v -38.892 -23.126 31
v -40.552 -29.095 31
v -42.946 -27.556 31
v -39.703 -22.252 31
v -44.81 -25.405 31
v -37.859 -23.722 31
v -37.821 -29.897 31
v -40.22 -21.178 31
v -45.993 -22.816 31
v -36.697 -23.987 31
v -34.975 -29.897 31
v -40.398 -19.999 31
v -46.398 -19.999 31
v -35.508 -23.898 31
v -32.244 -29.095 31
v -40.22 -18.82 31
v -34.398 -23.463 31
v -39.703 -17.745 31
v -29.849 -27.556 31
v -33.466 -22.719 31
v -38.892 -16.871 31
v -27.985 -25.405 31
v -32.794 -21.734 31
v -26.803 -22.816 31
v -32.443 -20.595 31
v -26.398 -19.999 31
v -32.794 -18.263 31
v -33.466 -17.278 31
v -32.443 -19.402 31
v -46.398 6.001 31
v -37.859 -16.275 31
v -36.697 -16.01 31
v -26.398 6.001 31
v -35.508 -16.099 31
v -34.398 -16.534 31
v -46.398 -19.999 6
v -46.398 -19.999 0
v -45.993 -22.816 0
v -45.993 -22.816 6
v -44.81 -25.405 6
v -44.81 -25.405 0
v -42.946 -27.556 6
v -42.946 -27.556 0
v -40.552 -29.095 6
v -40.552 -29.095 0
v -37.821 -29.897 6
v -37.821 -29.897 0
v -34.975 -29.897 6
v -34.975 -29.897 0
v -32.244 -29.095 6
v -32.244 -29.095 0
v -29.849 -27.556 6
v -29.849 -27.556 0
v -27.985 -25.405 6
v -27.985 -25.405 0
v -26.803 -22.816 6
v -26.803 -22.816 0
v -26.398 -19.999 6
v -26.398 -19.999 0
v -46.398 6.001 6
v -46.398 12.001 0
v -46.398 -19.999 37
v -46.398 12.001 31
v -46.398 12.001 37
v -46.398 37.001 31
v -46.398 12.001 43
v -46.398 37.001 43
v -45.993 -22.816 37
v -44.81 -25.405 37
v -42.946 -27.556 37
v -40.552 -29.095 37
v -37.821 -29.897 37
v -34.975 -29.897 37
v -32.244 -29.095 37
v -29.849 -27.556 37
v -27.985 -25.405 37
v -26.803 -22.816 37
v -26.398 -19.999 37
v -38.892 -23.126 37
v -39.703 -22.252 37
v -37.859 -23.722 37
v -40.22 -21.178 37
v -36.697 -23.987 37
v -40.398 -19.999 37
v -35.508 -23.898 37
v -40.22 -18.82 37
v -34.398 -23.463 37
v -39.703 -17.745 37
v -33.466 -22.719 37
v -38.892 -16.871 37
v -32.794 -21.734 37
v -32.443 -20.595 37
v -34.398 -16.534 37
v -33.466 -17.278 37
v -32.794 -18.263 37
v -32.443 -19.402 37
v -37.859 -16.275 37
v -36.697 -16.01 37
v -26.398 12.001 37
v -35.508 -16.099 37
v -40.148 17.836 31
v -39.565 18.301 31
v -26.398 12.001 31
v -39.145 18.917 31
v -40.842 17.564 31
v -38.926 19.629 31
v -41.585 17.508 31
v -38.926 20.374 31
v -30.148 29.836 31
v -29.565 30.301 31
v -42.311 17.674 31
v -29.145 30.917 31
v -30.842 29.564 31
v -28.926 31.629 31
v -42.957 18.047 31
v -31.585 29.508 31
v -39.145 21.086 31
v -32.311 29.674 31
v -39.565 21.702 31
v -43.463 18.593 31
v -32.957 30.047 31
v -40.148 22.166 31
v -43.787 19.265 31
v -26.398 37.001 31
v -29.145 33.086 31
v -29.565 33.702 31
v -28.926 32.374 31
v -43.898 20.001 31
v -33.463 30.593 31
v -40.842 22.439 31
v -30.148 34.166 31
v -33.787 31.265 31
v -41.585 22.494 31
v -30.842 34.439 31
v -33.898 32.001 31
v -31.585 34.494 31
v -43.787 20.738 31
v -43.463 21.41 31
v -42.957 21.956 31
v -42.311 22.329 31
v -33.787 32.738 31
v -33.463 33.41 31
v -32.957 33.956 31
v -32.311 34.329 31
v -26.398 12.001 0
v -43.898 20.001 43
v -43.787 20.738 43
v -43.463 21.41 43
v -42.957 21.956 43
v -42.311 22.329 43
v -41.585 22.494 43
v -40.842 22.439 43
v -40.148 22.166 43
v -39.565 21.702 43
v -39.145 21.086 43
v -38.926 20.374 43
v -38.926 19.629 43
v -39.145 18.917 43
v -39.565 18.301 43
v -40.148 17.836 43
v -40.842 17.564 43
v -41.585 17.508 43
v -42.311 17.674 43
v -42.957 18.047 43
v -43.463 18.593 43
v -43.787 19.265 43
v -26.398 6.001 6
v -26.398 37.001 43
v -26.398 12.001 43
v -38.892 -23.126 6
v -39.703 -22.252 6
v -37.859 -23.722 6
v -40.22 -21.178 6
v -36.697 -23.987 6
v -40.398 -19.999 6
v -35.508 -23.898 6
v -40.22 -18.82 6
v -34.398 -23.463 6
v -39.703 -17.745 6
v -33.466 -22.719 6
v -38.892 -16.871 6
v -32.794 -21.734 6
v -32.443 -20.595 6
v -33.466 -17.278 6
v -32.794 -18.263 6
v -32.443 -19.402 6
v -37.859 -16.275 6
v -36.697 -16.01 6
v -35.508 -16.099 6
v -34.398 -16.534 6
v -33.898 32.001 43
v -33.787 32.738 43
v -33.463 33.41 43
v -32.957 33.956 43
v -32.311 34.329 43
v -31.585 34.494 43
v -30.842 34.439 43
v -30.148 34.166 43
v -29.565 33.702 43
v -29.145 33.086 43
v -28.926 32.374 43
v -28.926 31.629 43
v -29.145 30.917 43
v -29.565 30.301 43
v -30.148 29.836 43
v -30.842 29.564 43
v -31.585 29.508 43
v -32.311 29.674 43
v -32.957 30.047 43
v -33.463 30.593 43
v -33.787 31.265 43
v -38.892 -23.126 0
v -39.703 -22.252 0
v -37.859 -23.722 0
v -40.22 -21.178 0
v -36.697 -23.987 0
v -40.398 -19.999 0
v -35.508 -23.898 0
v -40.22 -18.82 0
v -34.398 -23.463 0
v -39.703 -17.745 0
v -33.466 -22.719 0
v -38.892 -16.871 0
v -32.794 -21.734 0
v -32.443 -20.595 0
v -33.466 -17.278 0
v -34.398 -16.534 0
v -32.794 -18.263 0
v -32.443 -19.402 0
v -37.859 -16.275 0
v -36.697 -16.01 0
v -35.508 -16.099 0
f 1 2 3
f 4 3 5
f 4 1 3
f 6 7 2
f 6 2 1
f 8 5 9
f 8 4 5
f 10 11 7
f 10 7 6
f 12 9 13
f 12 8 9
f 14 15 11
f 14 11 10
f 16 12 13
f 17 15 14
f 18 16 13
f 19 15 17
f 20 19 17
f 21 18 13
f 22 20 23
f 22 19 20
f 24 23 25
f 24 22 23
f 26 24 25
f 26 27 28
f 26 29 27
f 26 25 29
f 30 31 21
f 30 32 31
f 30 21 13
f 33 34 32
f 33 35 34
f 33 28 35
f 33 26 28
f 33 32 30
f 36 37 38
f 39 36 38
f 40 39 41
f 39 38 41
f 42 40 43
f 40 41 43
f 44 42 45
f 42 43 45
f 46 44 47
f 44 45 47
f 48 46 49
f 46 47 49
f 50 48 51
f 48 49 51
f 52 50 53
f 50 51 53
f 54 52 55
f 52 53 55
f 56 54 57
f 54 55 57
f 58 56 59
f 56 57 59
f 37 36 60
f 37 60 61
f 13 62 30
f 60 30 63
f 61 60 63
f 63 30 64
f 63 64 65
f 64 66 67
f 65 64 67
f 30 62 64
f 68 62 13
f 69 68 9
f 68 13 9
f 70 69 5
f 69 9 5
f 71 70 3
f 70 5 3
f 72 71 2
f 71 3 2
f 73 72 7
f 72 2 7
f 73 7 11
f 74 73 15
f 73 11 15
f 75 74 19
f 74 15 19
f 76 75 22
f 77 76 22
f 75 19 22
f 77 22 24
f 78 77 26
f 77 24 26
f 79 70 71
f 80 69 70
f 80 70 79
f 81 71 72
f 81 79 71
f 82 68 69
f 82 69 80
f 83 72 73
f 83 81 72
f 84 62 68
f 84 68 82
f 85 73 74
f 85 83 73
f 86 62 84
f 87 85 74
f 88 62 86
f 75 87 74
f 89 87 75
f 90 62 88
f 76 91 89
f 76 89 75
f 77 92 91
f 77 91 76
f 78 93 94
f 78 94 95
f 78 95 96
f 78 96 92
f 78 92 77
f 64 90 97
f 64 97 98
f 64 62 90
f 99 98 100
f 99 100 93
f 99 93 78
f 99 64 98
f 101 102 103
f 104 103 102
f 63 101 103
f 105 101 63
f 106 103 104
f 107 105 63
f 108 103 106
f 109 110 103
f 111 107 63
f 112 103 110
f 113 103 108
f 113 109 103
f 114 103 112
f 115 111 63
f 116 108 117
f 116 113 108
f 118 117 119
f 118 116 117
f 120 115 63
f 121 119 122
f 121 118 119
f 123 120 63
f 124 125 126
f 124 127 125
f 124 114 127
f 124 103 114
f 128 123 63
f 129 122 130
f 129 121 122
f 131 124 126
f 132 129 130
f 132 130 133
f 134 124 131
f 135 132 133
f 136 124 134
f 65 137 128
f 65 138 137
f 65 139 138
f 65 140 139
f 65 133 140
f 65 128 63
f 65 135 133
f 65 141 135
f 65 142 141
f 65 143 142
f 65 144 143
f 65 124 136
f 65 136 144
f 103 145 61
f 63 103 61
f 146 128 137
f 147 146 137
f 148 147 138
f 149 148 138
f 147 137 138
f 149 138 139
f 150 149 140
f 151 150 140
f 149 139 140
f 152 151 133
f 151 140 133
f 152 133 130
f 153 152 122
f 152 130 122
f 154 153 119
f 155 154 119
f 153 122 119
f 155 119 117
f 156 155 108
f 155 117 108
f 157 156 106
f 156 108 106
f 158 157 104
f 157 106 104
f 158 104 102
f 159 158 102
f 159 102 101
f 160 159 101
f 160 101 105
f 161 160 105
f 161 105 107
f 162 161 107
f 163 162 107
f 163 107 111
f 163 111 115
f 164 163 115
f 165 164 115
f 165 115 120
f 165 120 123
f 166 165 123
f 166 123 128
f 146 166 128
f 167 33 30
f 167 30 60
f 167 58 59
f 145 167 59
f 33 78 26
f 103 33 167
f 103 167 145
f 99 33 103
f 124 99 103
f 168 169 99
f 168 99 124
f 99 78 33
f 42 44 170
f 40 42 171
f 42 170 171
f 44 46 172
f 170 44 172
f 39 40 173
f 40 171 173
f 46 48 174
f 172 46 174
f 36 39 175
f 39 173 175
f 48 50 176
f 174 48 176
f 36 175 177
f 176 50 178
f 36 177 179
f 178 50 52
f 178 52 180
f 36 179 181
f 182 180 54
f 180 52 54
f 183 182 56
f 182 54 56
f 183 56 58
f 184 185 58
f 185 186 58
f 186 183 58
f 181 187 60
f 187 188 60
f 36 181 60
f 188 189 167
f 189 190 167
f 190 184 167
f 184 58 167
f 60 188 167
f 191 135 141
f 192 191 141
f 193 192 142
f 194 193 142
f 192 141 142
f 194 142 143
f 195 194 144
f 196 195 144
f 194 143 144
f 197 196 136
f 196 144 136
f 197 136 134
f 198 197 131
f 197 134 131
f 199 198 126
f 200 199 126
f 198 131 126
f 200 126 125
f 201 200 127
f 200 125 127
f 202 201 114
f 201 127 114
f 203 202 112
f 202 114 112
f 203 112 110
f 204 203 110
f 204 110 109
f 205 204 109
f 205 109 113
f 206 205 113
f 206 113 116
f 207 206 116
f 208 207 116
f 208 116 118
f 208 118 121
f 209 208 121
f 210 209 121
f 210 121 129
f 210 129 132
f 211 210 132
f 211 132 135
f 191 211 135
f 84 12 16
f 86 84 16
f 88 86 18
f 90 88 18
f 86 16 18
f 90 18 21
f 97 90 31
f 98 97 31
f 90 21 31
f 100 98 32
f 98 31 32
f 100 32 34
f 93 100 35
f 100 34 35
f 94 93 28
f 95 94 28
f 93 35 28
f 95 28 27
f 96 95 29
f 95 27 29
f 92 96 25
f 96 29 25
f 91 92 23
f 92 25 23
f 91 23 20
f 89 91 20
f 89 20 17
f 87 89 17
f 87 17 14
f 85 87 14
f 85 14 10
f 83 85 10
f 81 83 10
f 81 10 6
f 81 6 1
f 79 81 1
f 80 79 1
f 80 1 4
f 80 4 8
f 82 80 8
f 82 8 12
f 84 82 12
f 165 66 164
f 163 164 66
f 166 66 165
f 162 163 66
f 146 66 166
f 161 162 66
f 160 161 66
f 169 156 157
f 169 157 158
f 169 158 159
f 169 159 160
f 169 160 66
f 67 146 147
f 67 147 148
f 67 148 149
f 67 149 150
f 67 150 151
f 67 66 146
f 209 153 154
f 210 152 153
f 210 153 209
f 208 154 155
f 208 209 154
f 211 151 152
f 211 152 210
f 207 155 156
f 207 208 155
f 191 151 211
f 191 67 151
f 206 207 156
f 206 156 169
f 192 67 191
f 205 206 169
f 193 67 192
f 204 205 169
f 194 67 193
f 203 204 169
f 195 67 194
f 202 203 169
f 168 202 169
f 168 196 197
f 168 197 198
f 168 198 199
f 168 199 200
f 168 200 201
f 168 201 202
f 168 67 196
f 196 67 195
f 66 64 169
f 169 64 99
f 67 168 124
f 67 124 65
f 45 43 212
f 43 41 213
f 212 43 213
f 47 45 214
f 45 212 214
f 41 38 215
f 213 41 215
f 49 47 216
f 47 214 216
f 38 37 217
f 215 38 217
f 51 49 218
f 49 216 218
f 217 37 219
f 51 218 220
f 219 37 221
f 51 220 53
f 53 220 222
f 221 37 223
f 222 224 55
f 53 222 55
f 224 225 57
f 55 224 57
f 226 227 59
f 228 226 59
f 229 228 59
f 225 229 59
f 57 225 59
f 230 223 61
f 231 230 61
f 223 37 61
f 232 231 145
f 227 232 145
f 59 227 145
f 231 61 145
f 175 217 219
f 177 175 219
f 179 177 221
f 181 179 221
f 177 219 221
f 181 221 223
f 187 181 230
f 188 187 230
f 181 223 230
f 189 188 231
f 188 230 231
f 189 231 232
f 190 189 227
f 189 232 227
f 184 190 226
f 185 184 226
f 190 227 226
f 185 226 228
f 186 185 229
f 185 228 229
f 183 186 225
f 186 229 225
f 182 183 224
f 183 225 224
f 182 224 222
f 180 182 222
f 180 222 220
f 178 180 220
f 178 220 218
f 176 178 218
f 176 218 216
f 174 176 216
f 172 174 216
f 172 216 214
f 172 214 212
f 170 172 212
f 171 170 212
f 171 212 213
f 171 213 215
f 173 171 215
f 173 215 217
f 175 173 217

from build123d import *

# Parameters (mm, degrees)
EXTRUDE_1_DEPTH     = 37
SKETCH_5_R          = 4
CUT_EXTRUDE_1_DEPTH = 67.495686501
SKETCH_6_W          = 25
SKETCH_6_H          = 39.826286975
CUT_EXTRUDE_2_DEPTH = 52.661548552
SKETCH_8_W          = 20
SKETCH_8_H          = 25
EXTRUDE_5_DEPTH     = 6
SKETCH_8_3_W        = 20
SKETCH_8_3_H        = 25
EXTRUDE_6_DEPTH     = 6
SKETCH_10_W         = 20
SKETCH_10_H         = 25
EXTRUDE_7_DEPTH     = 6
SKETCH_11_R         = 2.5
CUT_EXTRUDE_3_DEPTH = 67.954199448


with BuildPart() as part:
    # 草图1 → 凸台-拉伸1 (new body)
    with BuildSketch(Plane.XY):
        with BuildLine():
            Line((-26.397852585, -19.99859328), (-26.397852585, 12.00140672))
            Line((-26.397852585, 12.00140672), (-46.397852585, 12.00140672))
            Line((-46.397852585, 12.00140672), (-46.397852585, -19.99859328))
            ThreePointArc((-46.397852585, -19.99859328), (-36.397852585, -29.99859328), (-26.397852585, -19.99859328))
        make_face()
    extrude(amount=EXTRUDE_1_DEPTH)

    # 草图5 → 切除-拉伸1 (cut, through all)
    with BuildSketch(Plane(origin=(0, 0, 0), x_dir=(-1, 0, 0), z_dir=(0, 0, -1))):
        with Locations((36.397852585, -19.99859328)):
            Circle(SKETCH_5_R)
    extrude(amount=-CUT_EXTRUDE_1_DEPTH, mode=Mode.SUBTRACT)

    # 草图6 → 切除-拉伸2 (cut, through all)
    with BuildSketch(Plane(origin=(-26.397852585, 0, 0), x_dir=(0, 0, -1), z_dir=(1, 0, 0))):
        with Locations((-18.5, -13.911736768)):
            Rectangle(SKETCH_6_W, SKETCH_6_H)
    extrude(amount=-CUT_EXTRUDE_2_DEPTH, mode=Mode.SUBTRACT)



with BuildPart() as body_2:
    # 草图8 → 凸台-拉伸5 (new body)
    with BuildSketch(Plane.XY.offset(37)):
        with Locations((-36.397852585, 24.50140672)):
            Rectangle(SKETCH_8_W, SKETCH_8_H)
    extrude(amount=EXTRUDE_5_DEPTH)

    # 草图8<3> → 凸台-拉伸6 (add)
    with BuildSketch(Plane.XY.offset(37)):
        with Locations((-36.397852585, 24.50140672)):
            Rectangle(SKETCH_8_3_W, SKETCH_8_3_H)
    extrude(amount=EXTRUDE_6_DEPTH)


with BuildPart() as part_1:
    add(part.part)

    add(body_2.part)  # 凸台-拉伸7 merges body 2
    # 草图10 → 凸台-拉伸7 (add)
    with BuildSketch(Plane(origin=(0, 0, 37), x_dir=(-1, 0, 0), z_dir=(0, 0, -1))):
        with Locations((36.397852585, 24.50140672)):
            Rectangle(SKETCH_10_W, SKETCH_10_H)
    extrude(amount=EXTRUDE_7_DEPTH)

    # 草图11 → 切除-拉伸3 (cut, through all)
    with BuildSketch(Plane(origin=(0, 0, 31), x_dir=(-1, 0, 0), z_dir=(0, 0, -1))):
        with Locations((31.397852585, 32.00140672)):
            Circle(SKETCH_11_R)
        with Locations((41.397852585, 20.00140672)):
            Circle(SKETCH_11_R)
    extrude(amount=-CUT_EXTRUDE_3_DEPTH, mode=Mode.SUBTRACT)


solid = part_1.part
